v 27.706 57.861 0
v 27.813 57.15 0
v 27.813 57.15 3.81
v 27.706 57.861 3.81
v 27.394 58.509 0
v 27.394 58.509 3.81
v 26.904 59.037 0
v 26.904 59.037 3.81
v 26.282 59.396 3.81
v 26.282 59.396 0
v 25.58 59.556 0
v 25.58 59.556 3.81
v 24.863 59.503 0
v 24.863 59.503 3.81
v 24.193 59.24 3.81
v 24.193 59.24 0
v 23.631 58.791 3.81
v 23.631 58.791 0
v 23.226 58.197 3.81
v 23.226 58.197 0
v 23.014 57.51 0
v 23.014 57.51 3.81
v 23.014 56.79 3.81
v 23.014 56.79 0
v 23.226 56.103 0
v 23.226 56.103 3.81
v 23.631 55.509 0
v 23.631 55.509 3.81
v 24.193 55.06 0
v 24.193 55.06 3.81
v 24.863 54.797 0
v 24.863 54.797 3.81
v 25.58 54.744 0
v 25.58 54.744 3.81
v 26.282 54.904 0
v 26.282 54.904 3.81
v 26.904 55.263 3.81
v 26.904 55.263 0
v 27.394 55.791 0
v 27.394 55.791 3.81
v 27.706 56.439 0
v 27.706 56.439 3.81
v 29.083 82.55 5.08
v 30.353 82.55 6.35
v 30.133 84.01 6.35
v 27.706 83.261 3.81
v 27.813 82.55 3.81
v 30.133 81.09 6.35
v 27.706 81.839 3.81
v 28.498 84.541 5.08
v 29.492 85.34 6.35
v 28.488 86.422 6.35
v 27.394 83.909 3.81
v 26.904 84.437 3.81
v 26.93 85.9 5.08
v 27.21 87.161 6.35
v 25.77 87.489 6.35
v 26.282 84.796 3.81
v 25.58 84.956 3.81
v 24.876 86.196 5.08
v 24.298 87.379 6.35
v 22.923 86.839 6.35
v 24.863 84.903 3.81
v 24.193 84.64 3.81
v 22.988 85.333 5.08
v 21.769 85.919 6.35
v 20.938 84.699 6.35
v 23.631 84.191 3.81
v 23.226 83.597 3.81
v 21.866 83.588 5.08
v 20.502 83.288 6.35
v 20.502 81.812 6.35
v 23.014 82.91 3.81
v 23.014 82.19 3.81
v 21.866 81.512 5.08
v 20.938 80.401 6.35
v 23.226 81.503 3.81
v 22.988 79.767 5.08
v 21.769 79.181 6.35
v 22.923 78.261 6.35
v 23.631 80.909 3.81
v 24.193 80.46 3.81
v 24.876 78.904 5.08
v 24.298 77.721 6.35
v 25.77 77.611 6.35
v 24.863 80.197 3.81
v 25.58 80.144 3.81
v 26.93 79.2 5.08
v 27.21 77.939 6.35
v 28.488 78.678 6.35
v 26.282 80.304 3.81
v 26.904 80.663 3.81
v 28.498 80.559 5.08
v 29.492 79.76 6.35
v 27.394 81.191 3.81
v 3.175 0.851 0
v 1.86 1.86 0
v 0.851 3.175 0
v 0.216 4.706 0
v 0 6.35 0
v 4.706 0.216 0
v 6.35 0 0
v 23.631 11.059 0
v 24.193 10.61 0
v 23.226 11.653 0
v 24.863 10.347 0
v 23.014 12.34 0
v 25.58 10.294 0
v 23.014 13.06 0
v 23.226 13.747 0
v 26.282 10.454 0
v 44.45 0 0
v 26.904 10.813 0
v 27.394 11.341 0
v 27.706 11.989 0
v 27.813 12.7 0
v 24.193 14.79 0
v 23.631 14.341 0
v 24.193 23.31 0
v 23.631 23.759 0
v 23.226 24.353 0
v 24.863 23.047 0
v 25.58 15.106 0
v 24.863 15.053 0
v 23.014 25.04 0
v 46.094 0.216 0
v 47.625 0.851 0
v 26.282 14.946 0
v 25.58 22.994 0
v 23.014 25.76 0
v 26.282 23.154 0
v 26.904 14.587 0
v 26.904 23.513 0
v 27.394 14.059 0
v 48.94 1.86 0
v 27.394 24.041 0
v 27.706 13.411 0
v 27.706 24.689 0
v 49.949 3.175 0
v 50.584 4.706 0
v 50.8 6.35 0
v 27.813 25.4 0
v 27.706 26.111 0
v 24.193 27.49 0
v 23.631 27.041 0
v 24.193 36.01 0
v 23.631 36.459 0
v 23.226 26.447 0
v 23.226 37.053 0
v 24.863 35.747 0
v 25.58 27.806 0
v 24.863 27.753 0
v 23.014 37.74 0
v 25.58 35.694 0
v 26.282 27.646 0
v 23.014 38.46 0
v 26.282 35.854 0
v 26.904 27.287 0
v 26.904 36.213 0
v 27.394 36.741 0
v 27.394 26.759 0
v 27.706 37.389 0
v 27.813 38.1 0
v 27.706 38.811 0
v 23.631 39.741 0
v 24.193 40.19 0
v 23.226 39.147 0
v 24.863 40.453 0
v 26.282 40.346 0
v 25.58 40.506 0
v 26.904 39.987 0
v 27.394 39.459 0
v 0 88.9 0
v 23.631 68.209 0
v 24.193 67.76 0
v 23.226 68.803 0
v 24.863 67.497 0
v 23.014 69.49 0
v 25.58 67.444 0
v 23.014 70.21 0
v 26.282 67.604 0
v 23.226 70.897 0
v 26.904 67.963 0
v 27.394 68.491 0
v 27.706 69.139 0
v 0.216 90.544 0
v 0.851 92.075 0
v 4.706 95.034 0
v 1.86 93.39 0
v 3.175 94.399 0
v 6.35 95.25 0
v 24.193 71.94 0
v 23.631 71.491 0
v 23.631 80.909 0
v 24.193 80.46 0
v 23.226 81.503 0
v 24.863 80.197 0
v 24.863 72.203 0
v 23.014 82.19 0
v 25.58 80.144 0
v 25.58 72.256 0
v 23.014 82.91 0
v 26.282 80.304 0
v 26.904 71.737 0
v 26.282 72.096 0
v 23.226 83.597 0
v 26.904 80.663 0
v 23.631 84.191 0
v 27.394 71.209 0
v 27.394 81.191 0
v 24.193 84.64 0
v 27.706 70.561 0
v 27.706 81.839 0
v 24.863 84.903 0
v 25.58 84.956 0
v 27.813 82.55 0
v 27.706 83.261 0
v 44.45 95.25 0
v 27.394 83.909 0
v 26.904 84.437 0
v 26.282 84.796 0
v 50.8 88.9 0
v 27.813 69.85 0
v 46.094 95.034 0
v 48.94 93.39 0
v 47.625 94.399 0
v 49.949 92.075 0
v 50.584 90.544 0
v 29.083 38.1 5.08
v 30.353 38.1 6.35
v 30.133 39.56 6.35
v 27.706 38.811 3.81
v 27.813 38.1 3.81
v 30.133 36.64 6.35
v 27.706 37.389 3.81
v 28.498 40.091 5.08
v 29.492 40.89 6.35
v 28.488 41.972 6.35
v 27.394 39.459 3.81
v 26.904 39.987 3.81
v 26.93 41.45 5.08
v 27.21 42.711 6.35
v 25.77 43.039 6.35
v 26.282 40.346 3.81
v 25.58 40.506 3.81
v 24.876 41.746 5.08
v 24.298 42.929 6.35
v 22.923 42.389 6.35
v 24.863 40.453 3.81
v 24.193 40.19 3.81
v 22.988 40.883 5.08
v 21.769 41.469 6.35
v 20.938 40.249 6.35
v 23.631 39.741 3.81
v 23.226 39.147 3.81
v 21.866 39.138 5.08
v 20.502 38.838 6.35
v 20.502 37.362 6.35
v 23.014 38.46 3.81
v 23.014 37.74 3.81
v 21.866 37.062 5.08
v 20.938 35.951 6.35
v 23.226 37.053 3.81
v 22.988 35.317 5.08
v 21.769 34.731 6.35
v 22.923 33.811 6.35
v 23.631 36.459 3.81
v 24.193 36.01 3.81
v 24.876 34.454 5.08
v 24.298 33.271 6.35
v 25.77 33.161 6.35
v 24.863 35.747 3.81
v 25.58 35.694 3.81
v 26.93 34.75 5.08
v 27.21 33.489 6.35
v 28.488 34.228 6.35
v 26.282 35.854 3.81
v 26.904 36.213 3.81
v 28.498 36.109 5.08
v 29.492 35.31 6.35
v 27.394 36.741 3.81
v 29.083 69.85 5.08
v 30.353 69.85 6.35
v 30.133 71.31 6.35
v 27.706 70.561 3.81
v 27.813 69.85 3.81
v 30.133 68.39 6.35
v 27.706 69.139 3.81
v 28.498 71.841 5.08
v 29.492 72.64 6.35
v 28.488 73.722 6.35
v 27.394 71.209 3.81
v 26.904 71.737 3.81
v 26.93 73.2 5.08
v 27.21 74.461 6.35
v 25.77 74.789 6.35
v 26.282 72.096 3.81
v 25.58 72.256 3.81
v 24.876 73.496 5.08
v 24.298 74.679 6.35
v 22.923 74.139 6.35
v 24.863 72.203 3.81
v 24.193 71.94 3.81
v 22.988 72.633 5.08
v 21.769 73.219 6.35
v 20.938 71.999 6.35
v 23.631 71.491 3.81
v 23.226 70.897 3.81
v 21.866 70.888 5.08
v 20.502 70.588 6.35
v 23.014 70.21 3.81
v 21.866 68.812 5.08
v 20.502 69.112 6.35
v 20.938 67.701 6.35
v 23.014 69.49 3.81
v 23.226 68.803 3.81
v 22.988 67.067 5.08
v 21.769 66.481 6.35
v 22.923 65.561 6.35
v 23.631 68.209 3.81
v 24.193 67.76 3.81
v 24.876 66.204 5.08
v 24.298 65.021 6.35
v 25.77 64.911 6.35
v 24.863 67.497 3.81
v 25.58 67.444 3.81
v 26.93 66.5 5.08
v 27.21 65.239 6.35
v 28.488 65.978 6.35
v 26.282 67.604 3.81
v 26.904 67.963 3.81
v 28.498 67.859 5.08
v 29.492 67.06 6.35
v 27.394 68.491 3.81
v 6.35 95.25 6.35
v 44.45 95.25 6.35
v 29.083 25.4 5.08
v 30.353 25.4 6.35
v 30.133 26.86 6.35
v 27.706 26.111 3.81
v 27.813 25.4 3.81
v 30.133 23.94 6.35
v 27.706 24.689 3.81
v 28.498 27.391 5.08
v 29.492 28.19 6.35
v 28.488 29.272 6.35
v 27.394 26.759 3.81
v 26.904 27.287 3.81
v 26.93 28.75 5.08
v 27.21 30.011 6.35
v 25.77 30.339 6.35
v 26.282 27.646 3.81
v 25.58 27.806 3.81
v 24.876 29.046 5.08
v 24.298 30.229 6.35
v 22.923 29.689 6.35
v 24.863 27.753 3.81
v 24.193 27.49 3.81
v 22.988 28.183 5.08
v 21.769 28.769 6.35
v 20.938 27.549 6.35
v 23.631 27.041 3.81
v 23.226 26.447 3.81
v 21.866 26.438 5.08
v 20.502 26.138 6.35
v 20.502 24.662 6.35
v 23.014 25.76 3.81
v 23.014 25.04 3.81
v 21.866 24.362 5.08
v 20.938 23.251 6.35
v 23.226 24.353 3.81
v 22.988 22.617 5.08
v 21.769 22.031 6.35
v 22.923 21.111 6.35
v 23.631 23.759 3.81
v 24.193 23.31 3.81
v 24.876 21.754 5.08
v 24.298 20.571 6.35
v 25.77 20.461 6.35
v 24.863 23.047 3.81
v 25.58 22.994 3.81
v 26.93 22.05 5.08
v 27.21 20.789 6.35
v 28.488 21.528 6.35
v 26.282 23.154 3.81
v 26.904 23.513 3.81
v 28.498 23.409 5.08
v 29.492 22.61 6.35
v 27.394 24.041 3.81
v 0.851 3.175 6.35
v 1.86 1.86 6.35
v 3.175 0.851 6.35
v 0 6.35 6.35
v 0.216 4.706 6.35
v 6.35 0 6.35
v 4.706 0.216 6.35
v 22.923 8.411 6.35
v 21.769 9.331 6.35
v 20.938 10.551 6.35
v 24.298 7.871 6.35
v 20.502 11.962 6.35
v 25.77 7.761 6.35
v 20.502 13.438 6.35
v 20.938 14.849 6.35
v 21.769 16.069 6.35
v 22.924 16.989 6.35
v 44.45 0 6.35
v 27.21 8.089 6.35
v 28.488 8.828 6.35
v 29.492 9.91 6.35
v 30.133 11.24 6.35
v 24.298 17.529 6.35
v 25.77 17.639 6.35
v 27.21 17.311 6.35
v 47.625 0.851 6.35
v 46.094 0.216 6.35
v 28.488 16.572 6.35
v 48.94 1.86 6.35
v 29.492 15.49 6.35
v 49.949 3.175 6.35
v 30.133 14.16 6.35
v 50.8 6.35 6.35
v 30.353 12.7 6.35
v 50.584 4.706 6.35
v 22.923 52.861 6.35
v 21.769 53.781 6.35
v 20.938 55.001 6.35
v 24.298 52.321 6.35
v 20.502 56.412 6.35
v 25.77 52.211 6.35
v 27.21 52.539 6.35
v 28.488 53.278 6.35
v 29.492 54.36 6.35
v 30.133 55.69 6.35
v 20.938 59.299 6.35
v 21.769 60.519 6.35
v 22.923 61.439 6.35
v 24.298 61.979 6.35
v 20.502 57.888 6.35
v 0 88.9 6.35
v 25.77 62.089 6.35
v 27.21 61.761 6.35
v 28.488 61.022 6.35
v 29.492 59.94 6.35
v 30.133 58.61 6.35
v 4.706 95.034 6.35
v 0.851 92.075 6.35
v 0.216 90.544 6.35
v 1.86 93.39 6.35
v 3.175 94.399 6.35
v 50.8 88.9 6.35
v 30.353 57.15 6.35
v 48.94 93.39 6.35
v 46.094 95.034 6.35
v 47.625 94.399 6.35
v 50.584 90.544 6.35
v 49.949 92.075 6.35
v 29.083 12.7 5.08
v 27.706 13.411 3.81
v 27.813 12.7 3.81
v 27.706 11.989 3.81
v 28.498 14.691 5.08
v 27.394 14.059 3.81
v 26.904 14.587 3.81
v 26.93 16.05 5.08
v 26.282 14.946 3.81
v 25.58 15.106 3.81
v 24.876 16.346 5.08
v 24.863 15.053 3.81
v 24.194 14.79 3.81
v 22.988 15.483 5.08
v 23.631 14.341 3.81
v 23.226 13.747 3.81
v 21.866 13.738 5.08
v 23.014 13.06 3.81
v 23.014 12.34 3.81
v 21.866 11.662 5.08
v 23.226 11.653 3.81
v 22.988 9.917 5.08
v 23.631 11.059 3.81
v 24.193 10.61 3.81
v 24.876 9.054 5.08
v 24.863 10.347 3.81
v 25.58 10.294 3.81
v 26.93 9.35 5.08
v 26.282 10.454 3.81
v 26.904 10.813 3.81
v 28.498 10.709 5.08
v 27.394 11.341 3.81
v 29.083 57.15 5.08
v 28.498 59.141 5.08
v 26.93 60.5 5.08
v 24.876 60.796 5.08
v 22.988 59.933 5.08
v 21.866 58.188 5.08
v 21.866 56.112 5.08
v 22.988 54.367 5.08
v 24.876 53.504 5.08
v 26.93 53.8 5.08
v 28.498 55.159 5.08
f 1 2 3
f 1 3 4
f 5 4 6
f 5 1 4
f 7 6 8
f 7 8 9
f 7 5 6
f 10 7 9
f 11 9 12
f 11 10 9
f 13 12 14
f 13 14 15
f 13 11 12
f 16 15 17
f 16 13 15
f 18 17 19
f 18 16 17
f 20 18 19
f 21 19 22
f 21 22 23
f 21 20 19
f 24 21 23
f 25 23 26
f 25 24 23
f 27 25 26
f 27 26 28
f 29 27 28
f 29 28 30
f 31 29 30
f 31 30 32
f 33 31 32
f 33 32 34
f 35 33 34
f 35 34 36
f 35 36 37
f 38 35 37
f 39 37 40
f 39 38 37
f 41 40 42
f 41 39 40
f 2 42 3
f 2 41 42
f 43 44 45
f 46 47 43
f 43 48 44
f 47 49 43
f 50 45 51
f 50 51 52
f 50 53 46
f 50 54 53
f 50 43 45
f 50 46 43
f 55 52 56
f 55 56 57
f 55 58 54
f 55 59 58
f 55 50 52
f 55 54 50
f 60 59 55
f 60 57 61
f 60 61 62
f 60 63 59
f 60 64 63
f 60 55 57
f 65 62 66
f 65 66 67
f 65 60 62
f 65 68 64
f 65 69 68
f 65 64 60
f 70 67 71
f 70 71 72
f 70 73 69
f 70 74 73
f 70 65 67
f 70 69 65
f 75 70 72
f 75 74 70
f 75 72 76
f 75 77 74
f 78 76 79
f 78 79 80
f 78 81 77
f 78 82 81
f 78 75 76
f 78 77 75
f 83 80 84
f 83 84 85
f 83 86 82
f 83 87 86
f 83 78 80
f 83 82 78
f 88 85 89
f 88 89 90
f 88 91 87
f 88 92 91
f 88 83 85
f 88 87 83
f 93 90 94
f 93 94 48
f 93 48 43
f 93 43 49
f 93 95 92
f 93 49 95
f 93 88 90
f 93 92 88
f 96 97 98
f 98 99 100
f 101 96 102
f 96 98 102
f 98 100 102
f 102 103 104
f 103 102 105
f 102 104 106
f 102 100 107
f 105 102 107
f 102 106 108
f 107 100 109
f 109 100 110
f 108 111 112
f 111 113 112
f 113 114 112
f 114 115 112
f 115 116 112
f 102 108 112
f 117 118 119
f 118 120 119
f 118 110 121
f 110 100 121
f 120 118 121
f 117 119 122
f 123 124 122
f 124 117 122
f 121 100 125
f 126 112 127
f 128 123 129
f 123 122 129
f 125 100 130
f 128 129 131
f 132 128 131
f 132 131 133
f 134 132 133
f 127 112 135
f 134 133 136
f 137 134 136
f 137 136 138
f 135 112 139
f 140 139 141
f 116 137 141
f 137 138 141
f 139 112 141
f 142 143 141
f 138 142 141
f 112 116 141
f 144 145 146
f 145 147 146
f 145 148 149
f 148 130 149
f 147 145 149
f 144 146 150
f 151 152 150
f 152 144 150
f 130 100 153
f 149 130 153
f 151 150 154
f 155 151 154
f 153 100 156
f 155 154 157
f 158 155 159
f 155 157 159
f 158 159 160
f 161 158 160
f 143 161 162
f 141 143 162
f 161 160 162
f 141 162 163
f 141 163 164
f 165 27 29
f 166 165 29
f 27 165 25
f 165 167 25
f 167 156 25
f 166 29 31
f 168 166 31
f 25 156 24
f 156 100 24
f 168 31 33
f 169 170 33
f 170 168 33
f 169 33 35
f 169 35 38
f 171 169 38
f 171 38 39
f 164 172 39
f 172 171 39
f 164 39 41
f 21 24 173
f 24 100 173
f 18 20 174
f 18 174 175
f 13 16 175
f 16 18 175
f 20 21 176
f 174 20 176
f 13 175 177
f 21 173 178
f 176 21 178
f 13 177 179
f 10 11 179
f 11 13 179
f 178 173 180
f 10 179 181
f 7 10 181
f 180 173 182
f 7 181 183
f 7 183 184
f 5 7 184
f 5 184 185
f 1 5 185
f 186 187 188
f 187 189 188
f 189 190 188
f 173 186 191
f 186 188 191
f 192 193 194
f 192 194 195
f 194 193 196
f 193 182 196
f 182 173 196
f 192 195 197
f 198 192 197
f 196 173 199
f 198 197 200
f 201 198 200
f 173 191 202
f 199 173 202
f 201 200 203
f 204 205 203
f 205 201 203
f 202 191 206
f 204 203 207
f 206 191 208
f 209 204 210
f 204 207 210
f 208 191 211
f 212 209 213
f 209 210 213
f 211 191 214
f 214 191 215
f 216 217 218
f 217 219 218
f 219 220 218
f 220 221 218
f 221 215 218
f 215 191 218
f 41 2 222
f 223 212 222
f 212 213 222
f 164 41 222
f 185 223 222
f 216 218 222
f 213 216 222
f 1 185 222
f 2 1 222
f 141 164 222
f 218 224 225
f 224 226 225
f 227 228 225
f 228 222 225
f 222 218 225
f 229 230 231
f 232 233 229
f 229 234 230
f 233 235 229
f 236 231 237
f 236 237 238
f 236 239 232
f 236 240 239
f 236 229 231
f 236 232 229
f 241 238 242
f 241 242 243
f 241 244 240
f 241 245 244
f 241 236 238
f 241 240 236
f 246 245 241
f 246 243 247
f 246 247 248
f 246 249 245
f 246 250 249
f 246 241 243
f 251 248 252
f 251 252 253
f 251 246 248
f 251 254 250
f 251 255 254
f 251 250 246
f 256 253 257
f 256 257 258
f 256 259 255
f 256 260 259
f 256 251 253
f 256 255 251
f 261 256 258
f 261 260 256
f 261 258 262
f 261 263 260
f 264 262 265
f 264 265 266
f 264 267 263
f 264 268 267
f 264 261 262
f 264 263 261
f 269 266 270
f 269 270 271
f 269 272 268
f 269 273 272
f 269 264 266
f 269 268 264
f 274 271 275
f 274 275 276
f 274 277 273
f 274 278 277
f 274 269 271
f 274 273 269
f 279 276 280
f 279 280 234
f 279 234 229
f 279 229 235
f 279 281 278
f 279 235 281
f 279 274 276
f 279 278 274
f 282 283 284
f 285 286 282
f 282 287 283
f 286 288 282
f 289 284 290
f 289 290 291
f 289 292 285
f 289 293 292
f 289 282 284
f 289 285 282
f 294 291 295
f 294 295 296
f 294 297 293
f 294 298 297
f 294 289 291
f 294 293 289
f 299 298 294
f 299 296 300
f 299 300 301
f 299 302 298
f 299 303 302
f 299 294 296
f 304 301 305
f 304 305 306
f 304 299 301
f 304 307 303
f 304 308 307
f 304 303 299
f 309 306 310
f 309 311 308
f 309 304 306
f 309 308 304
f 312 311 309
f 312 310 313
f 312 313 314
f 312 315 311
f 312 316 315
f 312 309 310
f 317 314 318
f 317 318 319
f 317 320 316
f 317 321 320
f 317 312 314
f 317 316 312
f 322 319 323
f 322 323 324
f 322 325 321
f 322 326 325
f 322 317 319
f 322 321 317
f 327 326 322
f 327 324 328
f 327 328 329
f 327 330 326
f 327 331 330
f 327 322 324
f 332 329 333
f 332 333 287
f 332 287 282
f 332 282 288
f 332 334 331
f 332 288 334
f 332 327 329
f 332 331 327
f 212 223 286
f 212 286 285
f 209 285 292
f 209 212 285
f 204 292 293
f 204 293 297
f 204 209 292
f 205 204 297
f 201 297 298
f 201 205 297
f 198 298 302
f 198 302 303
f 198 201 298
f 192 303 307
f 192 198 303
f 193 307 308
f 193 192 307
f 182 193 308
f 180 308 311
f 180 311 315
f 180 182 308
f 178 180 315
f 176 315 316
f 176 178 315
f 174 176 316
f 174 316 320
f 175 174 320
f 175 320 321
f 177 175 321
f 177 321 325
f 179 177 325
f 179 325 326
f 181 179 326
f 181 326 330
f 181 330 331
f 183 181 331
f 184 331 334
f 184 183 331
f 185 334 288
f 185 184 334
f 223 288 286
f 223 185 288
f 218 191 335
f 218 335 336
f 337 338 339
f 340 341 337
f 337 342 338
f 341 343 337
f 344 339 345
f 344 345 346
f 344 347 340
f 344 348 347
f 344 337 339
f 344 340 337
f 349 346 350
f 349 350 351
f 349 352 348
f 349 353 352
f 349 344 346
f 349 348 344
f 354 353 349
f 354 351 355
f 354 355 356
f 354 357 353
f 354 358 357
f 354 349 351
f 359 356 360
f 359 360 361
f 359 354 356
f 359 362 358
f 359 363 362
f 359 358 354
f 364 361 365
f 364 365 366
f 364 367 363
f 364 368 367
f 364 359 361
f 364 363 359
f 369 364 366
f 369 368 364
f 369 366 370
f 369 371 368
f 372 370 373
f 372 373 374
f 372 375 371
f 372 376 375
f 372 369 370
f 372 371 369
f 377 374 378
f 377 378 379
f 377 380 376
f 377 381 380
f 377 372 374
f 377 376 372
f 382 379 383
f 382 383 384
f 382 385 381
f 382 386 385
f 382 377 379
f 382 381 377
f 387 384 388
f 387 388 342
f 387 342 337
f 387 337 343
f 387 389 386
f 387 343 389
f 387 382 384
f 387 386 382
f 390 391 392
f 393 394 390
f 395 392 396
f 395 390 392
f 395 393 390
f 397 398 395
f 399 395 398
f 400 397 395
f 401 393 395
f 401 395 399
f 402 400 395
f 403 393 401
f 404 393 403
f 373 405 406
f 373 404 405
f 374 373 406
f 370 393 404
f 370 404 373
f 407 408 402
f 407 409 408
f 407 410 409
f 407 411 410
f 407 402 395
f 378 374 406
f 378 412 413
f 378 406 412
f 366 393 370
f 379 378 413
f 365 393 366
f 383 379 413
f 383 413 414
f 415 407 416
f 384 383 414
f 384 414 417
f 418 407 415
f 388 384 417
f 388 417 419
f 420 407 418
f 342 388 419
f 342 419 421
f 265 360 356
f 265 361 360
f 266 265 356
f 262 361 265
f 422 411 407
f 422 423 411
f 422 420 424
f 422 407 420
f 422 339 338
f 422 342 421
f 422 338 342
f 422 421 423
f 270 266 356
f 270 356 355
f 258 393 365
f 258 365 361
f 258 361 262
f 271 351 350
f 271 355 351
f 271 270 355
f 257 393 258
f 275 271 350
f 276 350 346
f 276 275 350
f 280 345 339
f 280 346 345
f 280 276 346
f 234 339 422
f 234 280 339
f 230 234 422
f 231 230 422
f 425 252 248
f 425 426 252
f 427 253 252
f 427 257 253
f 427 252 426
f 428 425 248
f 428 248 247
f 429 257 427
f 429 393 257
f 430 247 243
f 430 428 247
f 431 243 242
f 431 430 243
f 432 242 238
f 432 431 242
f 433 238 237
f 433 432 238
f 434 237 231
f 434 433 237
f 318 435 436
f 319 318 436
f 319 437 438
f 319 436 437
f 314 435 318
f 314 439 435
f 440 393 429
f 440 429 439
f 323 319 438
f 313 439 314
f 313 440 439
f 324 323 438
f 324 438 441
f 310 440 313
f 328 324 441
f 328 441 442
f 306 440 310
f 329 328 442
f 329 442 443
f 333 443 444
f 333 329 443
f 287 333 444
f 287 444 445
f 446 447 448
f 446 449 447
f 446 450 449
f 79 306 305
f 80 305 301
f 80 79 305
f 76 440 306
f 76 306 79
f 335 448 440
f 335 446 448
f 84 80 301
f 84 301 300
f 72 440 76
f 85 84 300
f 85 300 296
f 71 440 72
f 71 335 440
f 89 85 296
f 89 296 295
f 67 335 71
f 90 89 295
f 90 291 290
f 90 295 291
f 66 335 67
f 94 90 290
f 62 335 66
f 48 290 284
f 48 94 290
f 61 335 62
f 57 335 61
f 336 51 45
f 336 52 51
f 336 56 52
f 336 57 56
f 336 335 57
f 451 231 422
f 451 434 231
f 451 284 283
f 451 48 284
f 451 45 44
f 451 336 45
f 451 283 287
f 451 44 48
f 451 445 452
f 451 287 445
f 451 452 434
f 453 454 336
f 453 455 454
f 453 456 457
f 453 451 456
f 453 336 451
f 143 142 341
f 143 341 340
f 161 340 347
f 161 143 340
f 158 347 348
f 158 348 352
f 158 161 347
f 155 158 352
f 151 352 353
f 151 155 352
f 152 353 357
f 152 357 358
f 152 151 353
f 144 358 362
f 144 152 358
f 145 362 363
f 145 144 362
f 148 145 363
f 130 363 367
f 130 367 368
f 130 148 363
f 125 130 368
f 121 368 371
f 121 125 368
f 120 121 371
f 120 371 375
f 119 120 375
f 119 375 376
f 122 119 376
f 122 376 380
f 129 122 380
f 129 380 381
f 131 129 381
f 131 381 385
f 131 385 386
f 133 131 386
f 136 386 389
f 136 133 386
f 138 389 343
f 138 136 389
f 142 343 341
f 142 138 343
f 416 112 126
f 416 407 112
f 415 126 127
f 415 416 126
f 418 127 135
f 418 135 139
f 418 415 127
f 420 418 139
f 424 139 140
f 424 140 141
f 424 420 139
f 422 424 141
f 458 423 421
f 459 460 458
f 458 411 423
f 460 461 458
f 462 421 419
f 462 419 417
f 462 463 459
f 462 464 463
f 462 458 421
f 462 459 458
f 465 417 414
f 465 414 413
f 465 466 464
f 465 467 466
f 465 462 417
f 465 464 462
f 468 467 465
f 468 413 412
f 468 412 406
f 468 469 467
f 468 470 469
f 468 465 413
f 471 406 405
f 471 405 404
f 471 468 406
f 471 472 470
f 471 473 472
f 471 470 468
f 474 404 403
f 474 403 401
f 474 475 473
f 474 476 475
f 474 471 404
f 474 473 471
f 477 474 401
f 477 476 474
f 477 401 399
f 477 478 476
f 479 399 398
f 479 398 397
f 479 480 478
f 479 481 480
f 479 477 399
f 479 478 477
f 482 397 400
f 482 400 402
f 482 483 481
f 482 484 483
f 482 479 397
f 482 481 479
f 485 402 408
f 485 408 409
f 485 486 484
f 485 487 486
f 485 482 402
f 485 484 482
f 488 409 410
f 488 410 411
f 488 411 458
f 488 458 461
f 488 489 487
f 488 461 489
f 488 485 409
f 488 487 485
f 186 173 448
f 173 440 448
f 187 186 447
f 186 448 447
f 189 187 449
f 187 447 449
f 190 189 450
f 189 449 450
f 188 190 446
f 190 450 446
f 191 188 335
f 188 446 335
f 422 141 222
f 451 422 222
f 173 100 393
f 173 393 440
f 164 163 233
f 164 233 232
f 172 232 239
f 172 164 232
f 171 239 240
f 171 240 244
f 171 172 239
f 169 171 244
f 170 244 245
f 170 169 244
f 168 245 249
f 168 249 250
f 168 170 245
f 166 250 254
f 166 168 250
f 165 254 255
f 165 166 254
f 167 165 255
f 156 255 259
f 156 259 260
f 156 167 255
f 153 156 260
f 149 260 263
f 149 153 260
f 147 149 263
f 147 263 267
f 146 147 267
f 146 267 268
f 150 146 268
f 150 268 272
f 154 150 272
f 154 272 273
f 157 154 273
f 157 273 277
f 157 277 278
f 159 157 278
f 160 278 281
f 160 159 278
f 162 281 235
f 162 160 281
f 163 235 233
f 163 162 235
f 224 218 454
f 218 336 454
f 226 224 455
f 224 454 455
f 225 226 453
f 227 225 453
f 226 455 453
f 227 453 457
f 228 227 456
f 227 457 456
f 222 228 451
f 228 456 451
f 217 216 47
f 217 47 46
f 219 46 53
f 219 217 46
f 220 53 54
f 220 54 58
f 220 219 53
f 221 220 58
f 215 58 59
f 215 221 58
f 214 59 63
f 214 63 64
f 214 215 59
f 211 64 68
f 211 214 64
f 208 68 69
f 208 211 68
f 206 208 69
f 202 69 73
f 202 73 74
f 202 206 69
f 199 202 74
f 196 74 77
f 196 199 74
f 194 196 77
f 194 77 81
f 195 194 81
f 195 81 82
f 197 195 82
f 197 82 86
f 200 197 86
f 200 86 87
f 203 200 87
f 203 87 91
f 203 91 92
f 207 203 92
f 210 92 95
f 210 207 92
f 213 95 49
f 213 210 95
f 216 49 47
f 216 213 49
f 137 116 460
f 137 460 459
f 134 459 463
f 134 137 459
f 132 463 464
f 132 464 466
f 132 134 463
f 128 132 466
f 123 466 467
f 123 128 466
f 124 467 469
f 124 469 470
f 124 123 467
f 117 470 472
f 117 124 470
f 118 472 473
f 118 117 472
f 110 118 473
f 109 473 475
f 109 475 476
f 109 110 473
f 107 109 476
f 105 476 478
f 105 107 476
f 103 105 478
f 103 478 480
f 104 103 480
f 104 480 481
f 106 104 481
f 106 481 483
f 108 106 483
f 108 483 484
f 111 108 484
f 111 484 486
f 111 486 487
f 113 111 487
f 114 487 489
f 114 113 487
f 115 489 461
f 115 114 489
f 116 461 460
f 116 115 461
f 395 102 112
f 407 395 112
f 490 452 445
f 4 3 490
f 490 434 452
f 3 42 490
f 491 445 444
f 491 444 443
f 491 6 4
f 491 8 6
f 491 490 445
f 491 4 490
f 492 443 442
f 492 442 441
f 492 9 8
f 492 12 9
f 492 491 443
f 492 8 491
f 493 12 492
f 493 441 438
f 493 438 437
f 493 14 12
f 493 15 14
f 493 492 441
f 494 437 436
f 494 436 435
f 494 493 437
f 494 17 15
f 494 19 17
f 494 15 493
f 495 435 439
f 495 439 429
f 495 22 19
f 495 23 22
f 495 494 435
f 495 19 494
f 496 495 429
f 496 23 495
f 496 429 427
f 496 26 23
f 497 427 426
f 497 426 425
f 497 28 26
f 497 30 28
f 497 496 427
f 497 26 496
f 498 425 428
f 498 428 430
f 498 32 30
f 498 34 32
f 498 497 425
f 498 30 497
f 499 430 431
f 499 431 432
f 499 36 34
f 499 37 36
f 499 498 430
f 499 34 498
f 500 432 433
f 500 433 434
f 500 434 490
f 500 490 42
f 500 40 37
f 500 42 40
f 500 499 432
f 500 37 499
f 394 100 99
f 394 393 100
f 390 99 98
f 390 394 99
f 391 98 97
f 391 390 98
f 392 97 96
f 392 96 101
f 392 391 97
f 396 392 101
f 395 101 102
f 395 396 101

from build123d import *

# Parameters (mm, degrees)
SKETCH1_W           = 50.8
SKETCH1_H           = 95.25
SKETCH1_R           = 2.413
BOSS_EXTRUDE1_DEPTH = 6.35
FILLET1_R           = 6.35
CHAMFER1_SIZE       = 2.54


with BuildPart() as part:
    # Sketch1 → Boss-Extrude1 (new body)
    with BuildSketch(Plane.XY):
        with Locations((25.4, 47.625)):
            Rectangle(SKETCH1_W, SKETCH1_H)
        with Locations((25.4, 69.85)):
            Circle(SKETCH1_R, mode=Mode.SUBTRACT)
        with Locations((25.4, 25.4)):
            Circle(SKETCH1_R, mode=Mode.SUBTRACT)
        with Locations((25.4, 57.15)):
            Circle(SKETCH1_R, mode=Mode.SUBTRACT)
        with Locations((25.4, 12.7)):
            Circle(SKETCH1_R, mode=Mode.SUBTRACT)
        with Locations((25.4, 38.1)):
            Circle(SKETCH1_R, mode=Mode.SUBTRACT)
        with Locations((25.4, 82.55)):
            Circle(SKETCH1_R, mode=Mode.SUBTRACT)
    extrude(amount=BOSS_EXTRUDE1_DEPTH)

    # Fillet1
    fillet1_edges = [part.edges().sort_by_distance(p)[0] for p in [
        (0, 95.25, 3.175),
        (50.8, 95.25, 3.175),
        (50.8, 0, 3.175),
        (0, 0, 3.175),
    ]]
    fillet(fillet1_edges, radius=FILLET1_R)

    # Chamfer1
    chamfer1_edges = [part.edges().sort_by_distance(p)[0] for p in [
        (22.987, 69.85, 6.35),
        (22.987, 25.4, 6.35),
        (22.987, 57.15, 6.35),
        (22.987, 12.7, 6.35),
        (22.987, 38.1, 6.35),
        (22.987, 82.55, 6.35),
    ]]
    chamfer(chamfer1_edges, length=CHAMFER1_SIZE)


solid = part.part
